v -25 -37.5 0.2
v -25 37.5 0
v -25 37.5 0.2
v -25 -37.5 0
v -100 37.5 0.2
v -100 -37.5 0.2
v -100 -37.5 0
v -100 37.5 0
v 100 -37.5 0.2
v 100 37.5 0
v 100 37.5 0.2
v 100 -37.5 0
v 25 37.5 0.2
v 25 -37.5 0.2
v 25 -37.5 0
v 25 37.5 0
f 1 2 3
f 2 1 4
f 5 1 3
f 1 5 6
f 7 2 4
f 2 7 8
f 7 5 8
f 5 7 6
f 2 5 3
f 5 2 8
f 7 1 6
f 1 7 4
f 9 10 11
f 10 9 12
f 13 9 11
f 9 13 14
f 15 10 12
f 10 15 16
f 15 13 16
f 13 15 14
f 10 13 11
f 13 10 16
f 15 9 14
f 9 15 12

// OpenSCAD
$fn=100;

THICKNESS = 0.2; //Square / outline thickness
SIZE = 75;
GAP = 50;
translate([-(SIZE+GAP/2),-(SIZE/2),0]) cube([SIZE,SIZE,THICKNESS]);
translate([GAP/2,-(SIZE/2),0]) cube([SIZE,SIZE,THICKNESS]);
